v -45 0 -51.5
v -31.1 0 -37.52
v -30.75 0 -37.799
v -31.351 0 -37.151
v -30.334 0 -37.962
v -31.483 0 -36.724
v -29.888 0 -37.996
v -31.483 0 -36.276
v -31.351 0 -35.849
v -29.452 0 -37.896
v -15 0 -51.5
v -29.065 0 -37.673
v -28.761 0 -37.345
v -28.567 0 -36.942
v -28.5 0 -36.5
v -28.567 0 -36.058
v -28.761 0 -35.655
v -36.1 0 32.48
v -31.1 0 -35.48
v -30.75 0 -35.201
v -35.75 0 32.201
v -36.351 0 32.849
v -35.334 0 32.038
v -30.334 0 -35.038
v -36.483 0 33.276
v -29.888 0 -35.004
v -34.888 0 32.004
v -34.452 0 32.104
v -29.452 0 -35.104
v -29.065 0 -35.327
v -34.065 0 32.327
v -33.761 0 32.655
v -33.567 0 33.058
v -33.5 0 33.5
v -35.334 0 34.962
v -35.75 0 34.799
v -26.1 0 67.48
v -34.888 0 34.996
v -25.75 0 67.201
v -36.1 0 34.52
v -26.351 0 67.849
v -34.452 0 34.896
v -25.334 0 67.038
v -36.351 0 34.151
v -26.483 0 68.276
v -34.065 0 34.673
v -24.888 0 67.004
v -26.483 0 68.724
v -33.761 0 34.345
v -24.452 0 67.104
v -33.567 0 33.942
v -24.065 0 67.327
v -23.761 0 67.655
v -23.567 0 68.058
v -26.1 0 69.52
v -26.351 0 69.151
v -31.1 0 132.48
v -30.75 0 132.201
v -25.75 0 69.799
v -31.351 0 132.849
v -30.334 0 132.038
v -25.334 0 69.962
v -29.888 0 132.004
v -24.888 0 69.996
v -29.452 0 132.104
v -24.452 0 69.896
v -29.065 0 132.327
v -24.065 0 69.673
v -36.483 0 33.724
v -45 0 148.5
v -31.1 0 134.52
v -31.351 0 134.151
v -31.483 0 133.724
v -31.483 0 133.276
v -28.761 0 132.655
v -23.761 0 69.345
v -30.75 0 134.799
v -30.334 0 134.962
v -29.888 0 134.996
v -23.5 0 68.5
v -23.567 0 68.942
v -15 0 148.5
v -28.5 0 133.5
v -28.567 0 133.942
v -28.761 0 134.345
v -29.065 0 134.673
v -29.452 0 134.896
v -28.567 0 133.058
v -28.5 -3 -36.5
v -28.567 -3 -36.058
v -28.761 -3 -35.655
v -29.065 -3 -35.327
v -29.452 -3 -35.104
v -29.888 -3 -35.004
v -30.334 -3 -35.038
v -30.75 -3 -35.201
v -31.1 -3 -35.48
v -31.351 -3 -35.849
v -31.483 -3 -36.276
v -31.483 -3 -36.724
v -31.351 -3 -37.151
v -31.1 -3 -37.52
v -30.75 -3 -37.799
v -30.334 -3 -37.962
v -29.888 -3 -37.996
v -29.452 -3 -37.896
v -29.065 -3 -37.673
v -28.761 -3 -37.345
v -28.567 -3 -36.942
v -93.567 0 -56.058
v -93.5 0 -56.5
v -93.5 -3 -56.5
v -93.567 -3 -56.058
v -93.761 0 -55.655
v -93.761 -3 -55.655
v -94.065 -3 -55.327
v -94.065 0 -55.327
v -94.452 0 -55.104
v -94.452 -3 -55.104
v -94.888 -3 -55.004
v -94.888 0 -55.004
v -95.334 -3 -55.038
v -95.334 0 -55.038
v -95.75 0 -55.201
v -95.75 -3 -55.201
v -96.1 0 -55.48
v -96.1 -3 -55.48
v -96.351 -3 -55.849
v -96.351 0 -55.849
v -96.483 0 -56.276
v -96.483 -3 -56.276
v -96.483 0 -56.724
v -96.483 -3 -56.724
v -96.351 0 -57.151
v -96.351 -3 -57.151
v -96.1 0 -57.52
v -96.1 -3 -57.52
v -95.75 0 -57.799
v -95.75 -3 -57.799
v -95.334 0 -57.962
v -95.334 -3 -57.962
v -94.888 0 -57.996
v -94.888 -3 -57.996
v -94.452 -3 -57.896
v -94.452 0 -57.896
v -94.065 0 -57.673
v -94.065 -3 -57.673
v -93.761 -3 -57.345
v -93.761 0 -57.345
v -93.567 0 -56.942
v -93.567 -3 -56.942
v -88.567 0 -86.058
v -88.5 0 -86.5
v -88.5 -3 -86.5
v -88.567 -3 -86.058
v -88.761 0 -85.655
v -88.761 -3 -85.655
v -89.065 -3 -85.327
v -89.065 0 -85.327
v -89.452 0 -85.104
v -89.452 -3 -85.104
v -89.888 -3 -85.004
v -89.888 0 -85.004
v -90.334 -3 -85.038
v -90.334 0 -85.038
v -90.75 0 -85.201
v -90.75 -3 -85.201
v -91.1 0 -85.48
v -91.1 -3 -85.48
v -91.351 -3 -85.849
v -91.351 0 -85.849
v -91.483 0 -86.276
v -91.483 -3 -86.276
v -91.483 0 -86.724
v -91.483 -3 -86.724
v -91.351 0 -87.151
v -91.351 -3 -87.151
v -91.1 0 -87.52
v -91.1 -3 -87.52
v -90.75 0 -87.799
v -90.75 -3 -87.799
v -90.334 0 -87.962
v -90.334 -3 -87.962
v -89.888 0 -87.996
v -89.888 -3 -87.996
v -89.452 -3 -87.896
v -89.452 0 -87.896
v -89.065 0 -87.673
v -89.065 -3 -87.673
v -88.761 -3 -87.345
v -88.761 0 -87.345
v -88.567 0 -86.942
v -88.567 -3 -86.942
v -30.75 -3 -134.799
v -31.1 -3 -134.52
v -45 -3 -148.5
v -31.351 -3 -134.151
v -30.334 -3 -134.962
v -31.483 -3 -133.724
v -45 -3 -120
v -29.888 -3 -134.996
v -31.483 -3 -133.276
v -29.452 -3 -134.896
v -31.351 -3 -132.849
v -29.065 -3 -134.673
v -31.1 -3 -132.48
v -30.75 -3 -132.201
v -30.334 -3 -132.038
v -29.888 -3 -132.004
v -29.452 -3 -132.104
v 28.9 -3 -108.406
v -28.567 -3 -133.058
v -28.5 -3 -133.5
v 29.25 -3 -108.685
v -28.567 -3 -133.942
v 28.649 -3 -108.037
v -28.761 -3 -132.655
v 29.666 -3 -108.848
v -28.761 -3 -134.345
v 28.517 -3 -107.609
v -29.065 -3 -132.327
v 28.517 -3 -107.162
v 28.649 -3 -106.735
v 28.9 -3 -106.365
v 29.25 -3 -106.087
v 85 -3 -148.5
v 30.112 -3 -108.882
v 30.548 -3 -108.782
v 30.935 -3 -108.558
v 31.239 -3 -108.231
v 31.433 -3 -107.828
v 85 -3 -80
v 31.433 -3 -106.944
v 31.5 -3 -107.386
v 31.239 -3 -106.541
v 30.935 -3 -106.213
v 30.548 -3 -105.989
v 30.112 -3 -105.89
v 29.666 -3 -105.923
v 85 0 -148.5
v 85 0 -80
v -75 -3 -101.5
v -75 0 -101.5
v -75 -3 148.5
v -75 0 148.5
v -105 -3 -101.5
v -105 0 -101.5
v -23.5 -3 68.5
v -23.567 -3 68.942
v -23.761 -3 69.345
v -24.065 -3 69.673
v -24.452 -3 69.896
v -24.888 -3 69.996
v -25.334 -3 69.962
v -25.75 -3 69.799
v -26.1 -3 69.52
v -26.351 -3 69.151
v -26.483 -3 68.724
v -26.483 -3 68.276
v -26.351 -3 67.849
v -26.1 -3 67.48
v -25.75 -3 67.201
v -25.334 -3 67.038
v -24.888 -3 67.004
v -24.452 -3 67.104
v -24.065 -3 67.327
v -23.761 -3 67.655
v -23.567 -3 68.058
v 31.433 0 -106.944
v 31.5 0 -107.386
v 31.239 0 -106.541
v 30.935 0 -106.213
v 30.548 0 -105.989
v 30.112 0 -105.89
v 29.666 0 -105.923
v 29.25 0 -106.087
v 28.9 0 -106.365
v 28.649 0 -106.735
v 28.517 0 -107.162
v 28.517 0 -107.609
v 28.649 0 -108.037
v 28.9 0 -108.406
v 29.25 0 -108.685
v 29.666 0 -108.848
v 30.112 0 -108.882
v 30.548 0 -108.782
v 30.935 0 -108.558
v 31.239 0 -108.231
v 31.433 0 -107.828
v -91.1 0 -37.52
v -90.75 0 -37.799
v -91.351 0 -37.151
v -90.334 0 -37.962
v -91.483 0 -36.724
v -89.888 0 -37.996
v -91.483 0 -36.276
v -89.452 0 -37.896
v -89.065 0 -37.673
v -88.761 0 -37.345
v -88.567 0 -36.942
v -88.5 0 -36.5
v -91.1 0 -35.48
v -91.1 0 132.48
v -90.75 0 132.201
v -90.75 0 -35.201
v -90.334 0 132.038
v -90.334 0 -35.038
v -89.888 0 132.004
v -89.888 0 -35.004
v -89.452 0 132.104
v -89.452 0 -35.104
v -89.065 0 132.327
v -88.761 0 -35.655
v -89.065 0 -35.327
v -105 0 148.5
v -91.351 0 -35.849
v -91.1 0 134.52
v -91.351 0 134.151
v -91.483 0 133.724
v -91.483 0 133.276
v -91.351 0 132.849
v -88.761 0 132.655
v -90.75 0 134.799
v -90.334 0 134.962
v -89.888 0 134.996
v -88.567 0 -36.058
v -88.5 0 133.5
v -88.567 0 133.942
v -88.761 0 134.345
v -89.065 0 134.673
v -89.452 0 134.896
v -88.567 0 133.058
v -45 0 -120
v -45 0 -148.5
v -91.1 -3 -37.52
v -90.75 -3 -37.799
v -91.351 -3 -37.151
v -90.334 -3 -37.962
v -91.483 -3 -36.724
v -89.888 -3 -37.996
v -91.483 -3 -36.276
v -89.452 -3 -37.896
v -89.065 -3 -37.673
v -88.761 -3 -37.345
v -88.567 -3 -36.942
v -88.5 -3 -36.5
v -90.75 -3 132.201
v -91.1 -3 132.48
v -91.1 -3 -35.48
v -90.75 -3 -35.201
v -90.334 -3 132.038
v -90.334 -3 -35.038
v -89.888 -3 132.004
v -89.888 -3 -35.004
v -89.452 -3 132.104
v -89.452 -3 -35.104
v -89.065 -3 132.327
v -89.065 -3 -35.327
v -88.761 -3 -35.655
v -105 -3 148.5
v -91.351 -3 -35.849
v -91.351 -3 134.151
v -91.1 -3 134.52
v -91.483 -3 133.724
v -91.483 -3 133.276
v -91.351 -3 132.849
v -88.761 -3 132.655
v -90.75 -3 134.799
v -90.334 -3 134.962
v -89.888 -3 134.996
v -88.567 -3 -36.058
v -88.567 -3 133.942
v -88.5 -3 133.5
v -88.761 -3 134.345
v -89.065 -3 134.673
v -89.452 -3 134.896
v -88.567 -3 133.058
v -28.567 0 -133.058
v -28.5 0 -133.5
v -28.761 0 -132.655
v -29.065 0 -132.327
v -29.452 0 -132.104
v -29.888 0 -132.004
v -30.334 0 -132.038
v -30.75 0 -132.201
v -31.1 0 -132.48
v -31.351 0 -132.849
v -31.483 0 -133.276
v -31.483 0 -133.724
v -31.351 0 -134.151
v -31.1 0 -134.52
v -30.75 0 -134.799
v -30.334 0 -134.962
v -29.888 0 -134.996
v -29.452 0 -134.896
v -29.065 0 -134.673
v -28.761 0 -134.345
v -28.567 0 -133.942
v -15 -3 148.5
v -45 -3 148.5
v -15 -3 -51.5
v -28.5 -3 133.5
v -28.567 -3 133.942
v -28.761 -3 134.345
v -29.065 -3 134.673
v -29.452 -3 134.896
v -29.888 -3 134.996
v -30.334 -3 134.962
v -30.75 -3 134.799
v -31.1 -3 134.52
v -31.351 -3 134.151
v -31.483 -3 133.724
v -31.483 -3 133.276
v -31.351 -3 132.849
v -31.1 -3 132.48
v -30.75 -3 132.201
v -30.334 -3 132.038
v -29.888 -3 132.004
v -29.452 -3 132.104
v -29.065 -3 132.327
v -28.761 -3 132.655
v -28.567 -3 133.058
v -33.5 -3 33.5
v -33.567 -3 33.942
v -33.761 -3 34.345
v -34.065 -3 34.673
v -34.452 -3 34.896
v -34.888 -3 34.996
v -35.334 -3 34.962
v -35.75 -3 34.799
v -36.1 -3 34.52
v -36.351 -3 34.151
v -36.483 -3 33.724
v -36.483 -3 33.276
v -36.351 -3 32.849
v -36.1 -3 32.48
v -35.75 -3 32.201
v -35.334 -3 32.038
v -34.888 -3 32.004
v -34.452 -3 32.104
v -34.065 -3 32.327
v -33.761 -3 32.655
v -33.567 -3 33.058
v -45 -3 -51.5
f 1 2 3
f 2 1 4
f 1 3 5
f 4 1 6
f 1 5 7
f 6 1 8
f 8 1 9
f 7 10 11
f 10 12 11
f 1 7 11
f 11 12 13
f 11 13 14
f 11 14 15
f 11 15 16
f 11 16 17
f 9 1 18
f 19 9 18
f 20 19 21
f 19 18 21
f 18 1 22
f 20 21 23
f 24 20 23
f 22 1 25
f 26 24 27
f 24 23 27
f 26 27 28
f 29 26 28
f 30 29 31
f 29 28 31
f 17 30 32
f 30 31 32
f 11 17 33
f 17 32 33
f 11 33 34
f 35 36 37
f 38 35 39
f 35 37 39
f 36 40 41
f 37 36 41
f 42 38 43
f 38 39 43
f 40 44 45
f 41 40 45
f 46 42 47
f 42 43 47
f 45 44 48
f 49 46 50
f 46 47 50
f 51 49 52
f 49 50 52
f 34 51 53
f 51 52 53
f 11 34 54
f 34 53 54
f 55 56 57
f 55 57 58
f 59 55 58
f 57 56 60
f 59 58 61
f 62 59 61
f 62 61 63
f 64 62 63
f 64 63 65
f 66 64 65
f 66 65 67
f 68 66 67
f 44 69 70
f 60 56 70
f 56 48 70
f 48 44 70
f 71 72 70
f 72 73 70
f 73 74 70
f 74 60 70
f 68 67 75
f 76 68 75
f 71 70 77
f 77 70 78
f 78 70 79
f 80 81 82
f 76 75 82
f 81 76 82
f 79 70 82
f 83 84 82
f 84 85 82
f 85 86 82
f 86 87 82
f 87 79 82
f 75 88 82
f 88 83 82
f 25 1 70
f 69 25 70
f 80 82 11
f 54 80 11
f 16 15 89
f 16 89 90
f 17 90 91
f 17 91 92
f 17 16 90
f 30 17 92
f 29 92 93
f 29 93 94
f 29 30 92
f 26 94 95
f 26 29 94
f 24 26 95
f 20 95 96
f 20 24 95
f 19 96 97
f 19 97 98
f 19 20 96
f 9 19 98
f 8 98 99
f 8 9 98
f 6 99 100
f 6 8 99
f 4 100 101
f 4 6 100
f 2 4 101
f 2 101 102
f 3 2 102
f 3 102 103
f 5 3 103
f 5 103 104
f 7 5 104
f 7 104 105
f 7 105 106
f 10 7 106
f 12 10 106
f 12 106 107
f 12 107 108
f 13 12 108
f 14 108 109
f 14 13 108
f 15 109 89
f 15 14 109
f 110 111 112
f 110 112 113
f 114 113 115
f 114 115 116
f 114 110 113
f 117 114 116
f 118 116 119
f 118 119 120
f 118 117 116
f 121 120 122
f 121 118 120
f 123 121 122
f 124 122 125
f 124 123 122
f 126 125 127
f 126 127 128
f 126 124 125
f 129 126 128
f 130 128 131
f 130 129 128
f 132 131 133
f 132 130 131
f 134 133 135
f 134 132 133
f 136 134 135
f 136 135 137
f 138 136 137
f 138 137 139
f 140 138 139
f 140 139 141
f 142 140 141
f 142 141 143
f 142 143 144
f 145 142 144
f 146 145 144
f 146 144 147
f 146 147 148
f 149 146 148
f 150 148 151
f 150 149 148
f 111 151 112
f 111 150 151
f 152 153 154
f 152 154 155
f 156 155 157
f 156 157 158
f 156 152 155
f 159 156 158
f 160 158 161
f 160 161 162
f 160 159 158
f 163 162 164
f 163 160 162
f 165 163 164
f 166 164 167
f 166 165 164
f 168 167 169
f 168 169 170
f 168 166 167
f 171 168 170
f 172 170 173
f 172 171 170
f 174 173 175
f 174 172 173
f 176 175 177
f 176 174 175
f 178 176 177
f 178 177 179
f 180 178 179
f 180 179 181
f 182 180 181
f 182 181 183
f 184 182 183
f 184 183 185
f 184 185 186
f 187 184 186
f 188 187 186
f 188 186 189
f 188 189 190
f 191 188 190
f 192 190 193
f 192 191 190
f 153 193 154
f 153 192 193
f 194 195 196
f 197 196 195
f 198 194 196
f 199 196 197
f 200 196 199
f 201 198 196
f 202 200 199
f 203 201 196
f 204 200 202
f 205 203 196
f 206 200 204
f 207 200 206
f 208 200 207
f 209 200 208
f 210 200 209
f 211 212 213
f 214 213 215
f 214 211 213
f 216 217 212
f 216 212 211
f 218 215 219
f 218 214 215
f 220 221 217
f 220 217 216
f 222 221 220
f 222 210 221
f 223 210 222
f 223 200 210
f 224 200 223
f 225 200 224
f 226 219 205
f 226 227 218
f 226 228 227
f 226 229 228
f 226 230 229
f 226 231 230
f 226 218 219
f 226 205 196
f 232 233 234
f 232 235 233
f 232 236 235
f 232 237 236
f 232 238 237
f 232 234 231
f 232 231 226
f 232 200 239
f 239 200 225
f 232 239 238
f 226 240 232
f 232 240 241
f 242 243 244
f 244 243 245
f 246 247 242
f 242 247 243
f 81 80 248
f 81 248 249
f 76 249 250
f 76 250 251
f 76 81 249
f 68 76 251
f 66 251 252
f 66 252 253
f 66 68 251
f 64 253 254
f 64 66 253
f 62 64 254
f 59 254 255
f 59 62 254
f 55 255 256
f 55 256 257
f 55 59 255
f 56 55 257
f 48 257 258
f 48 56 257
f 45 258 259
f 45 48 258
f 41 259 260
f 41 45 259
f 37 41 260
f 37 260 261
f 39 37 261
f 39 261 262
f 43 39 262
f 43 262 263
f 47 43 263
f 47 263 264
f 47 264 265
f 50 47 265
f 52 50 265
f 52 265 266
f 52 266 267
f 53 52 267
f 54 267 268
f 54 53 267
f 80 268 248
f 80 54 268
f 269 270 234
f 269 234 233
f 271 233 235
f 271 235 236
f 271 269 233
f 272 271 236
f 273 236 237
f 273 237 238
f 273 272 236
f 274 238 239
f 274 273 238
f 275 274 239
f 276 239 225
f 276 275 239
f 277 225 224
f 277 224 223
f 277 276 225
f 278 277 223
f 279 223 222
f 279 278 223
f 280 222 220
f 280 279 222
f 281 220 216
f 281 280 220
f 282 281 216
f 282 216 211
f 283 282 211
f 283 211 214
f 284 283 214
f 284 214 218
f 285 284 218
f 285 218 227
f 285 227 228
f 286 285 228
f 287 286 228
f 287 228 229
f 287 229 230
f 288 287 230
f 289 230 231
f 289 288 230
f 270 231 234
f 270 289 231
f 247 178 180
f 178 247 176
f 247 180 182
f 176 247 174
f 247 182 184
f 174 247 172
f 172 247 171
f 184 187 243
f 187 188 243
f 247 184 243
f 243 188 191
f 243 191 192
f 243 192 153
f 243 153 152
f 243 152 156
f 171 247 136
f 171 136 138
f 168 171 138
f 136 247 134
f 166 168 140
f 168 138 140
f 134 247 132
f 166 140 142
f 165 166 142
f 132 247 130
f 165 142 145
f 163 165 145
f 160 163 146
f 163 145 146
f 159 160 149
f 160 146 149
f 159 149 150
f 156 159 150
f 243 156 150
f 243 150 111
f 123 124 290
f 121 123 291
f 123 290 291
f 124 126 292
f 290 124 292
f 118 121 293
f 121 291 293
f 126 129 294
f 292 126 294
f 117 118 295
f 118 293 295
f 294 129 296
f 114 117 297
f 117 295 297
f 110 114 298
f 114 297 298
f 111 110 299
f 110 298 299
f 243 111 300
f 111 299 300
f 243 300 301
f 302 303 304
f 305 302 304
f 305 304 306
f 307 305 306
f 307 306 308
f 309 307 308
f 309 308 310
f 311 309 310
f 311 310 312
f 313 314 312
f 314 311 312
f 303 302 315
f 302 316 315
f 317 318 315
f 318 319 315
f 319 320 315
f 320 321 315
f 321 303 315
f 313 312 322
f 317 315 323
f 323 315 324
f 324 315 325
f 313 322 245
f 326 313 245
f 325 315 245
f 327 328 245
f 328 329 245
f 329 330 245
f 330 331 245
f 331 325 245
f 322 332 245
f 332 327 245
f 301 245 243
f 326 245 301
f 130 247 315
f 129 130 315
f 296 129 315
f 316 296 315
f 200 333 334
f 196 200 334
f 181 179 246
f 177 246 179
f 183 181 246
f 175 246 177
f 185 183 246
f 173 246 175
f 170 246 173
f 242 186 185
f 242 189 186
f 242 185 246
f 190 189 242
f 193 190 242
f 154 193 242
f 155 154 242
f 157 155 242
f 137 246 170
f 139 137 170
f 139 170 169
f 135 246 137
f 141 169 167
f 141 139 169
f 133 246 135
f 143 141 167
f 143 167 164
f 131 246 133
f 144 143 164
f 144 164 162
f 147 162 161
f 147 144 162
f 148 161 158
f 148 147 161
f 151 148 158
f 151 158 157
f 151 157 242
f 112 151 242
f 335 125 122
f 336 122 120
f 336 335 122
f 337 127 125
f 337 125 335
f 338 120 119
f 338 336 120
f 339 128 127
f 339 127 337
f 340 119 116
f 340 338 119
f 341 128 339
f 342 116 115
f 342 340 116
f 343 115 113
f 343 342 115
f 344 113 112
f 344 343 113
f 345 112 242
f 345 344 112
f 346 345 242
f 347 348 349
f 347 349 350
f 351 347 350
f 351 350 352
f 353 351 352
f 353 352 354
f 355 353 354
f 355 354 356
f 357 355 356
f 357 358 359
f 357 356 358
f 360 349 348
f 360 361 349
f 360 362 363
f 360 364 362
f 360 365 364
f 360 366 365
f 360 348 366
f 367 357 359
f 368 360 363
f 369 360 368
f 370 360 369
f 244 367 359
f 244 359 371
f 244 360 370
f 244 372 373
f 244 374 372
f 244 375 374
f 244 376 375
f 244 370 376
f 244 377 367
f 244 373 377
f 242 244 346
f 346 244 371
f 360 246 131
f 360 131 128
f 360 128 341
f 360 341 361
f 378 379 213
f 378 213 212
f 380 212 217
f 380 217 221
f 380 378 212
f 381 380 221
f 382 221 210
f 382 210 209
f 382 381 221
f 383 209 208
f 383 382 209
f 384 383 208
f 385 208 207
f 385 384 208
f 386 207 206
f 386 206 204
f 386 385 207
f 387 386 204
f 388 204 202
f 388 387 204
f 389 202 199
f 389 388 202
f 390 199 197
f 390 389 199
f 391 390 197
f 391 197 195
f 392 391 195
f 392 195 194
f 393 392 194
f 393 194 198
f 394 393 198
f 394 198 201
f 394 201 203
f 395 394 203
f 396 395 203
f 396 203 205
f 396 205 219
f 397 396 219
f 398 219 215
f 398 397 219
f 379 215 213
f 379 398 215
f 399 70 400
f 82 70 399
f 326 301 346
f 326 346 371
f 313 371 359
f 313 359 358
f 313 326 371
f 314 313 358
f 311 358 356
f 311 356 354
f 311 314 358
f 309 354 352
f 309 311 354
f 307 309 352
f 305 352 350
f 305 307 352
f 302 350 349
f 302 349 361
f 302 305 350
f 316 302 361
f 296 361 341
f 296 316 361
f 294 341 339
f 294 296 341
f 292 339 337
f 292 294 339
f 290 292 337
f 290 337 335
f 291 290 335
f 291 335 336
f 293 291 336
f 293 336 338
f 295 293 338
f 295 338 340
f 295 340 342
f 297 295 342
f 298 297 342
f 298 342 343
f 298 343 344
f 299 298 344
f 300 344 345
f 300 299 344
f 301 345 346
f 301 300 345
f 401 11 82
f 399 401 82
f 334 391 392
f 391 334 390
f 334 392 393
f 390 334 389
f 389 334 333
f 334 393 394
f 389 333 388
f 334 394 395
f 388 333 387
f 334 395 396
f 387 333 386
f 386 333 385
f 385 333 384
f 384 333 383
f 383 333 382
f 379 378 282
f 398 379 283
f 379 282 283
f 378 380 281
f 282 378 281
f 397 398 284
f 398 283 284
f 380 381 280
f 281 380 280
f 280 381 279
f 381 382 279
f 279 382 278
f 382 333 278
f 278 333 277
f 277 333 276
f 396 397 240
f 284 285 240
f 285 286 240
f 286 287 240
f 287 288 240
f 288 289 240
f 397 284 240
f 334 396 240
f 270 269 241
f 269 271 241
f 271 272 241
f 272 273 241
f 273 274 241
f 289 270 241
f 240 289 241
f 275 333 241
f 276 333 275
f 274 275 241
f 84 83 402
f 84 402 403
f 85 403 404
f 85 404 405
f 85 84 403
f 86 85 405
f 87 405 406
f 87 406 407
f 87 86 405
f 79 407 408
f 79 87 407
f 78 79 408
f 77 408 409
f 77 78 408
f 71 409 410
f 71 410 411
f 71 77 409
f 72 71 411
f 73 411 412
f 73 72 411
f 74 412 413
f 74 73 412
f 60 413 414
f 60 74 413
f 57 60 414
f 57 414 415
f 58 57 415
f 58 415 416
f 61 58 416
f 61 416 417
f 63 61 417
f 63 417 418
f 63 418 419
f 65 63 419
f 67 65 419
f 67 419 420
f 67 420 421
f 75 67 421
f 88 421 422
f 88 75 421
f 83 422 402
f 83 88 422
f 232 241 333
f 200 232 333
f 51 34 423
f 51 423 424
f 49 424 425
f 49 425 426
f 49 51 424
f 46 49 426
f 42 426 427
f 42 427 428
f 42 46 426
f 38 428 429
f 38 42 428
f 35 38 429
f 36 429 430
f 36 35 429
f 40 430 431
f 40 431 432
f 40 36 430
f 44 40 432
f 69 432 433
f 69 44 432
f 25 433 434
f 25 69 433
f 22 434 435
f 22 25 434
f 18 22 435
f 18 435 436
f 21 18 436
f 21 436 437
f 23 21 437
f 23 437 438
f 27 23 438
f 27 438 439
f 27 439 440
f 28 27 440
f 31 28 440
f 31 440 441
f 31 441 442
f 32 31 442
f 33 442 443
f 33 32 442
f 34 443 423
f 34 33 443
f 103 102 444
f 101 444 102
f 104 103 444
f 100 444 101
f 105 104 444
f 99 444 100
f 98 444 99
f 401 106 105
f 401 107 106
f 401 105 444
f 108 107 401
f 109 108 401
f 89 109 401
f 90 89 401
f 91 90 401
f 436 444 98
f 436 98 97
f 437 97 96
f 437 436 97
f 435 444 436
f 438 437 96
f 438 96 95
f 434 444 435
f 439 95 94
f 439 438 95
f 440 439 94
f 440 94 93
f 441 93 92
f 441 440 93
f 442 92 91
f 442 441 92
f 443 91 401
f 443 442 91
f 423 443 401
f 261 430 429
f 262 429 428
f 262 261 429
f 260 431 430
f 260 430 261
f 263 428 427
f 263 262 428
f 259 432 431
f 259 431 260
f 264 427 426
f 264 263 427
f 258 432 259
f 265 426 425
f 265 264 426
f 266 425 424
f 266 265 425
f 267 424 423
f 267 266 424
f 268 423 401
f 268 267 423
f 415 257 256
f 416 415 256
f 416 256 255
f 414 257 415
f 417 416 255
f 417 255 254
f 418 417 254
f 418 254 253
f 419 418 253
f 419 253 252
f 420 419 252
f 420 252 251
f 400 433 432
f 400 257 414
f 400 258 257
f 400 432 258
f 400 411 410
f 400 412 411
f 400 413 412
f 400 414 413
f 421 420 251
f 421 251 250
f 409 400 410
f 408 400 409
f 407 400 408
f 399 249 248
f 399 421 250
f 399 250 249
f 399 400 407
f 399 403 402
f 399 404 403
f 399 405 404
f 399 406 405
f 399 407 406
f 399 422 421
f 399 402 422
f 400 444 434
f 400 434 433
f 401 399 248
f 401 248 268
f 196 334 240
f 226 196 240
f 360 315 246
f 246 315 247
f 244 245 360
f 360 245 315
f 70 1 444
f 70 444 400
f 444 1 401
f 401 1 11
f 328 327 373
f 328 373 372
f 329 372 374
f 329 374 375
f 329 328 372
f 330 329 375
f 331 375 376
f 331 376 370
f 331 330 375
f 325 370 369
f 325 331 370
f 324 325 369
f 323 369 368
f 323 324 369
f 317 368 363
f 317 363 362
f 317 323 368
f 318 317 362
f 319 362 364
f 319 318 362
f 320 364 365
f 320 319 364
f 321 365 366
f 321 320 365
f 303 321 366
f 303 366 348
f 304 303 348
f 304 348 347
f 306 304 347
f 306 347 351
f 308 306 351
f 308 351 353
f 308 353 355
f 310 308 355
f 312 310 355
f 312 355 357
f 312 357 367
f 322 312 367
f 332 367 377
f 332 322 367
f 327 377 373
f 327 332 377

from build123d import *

# Parameters (mm, degrees)
F0_R     = 1.5
F0_W     = 30
F0_H     = 200
F1_DEPTH = 3


with BuildPart() as f1:
    # F0 (on Front) → F1 (new body)
    with BuildSketch(Plane.XZ):
        Polygon((-90, -101.5), (-75, -101.5), (-75, 148.5), (-105, 148.5), (-105, -101.5), align=None)
        with Locations((-90, -86.5)):
            Circle(F0_R, mode=Mode.SUBTRACT)
        with Locations((-95, -56.5)):
            Circle(F0_R, mode=Mode.SUBTRACT)
        with Locations((-90, -36.5)):
            Circle(F0_R, mode=Mode.SUBTRACT)
        with Locations((-90, 133.5)):
            Circle(F0_R, mode=Mode.SUBTRACT)
        with Locations((-30, 48.5)):
            Rectangle(F0_W, F0_H)
        with Locations((-30, -36.5)):
            Circle(F0_R, mode=Mode.SUBTRACT)
        with Locations((-35, 33.5)):
            Circle(F0_R, mode=Mode.SUBTRACT)
        with Locations((-25, 68.5)):
            Circle(F0_R, mode=Mode.SUBTRACT)
        with Locations((-30, 133.5)):
            Circle(F0_R, mode=Mode.SUBTRACT)
        Polygon((-45, -148.5), (85, -148.5), (85, -128.5), (85, -108.5), (85, -88.5), (85, -80), (-45, -120), (-45, -125), align=None)
        with Locations((-30, -133.5)):
            Circle(F0_R, mode=Mode.SUBTRACT)
        with Locations((30, -107.385747)):
            Circle(F0_R, mode=Mode.SUBTRACT)
    extrude(amount=F1_DEPTH)


solid = f1.part
